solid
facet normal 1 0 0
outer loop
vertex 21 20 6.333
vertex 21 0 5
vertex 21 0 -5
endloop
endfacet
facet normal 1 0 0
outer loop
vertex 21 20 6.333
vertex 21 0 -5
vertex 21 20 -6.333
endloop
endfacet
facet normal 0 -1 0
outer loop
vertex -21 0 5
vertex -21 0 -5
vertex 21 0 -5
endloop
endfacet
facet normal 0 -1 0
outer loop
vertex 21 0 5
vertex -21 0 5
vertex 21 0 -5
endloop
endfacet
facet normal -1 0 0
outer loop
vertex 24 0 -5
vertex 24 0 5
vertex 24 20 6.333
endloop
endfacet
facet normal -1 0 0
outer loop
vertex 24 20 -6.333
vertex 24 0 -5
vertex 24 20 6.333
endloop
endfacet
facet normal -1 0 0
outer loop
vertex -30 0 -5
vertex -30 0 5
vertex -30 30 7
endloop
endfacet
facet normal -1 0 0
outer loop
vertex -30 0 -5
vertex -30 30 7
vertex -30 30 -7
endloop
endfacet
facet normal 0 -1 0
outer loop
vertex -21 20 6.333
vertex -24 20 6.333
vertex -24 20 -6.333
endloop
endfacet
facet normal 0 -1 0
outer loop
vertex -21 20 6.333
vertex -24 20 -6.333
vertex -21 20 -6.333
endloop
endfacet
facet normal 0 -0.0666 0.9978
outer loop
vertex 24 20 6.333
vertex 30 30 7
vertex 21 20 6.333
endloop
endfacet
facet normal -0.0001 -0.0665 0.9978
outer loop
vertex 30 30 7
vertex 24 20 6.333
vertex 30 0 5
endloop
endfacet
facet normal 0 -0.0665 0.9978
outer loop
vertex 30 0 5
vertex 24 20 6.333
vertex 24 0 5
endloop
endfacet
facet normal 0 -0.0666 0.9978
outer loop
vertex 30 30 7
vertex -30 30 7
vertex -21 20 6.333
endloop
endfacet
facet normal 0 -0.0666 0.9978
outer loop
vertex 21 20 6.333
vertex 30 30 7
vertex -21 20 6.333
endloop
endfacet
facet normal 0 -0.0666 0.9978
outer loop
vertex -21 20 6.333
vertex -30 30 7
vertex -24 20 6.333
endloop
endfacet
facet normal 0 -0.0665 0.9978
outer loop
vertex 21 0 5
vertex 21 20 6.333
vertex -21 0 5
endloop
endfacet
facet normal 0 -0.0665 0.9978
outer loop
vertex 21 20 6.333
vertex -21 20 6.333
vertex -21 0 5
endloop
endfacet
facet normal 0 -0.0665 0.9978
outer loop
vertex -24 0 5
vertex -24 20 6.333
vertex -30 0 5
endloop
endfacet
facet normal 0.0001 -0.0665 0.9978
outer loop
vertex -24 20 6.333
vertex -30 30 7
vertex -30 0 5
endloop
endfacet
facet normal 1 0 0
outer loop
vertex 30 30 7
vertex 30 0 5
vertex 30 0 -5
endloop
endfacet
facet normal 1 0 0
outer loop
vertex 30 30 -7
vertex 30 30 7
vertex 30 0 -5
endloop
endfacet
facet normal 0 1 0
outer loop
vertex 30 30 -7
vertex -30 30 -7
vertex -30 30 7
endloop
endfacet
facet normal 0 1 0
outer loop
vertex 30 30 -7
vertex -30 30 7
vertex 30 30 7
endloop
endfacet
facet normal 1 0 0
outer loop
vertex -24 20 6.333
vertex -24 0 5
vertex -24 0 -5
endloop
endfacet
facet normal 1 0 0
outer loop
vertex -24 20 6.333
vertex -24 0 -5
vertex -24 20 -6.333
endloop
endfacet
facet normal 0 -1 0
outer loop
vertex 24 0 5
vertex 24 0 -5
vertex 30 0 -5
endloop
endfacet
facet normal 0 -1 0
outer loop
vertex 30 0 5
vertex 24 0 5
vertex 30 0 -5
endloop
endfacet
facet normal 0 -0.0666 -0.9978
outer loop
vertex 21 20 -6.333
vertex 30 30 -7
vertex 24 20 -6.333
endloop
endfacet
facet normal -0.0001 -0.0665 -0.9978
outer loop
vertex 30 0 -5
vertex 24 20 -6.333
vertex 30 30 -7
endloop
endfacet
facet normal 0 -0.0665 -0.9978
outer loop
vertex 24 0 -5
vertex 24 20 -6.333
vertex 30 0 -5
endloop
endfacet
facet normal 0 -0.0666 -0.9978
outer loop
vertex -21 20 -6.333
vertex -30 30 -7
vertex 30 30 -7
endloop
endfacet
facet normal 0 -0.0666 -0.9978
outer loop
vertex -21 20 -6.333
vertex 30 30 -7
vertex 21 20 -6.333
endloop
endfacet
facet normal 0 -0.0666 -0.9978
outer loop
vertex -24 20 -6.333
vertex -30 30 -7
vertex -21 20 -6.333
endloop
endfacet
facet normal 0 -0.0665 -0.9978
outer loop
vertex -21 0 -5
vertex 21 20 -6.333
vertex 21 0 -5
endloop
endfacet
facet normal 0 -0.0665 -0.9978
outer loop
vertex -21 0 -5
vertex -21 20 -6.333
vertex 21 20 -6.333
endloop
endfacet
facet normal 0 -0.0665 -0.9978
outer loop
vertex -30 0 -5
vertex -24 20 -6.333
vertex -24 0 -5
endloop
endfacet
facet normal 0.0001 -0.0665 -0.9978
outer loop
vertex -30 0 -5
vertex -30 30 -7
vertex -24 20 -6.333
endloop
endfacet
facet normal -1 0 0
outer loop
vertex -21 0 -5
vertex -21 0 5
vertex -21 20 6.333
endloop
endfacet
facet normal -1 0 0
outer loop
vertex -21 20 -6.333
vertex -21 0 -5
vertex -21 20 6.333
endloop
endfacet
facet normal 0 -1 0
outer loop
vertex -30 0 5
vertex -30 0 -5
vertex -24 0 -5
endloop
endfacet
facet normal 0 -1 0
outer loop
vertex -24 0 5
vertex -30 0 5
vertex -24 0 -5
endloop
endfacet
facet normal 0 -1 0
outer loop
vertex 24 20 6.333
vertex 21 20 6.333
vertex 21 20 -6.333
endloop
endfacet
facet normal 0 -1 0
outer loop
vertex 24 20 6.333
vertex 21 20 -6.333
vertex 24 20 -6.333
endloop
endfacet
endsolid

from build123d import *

# Parameters (mm, degrees)
SKETCH1_W           = 60
SKETCH1_H           = 14
BOSS_EXTRUDE1_DEPTH = 30
SKETCH2_W           = 3
SKETCH2_H           = 20
CUT_EXTRUDE1_DEPTH  = 45.676615807
CUT_EXTRUDE2_DEPTH  = 68.446274916


with BuildPart() as part:
    # Sketch1 → Boss-Extrude1 (new body)
    with BuildSketch(Plane(origin=(0, 0, 0), x_dir=(1, 0, 0), z_dir=(0, 1, 0))):
        Rectangle(SKETCH1_W, SKETCH1_H)
    extrude(amount=BOSS_EXTRUDE1_DEPTH)

    # Sketch2 → Cut-Extrude1 (cut, through all)
    with BuildSketch(Plane.XY.offset(7)):
        with Locations((-22.5, 10)):
            Rectangle(SKETCH2_W, SKETCH2_H)
        with Locations((22.5, 10)):
            Rectangle(SKETCH2_W, SKETCH2_H)
    extrude(amount=-CUT_EXTRUDE1_DEPTH, mode=Mode.SUBTRACT)

    # Sketch3 → Cut-Extrude2 (cut, through all)
    with BuildSketch(Plane.ZY.offset(30)):
        Polygon((-7, 30), (-5, 0), (-7, 0), align=None)
        Polygon((7, 30), (5, 0), (7, 0), align=None)
    extrude(amount=-CUT_EXTRUDE2_DEPTH, mode=Mode.SUBTRACT)


solid = part.part
